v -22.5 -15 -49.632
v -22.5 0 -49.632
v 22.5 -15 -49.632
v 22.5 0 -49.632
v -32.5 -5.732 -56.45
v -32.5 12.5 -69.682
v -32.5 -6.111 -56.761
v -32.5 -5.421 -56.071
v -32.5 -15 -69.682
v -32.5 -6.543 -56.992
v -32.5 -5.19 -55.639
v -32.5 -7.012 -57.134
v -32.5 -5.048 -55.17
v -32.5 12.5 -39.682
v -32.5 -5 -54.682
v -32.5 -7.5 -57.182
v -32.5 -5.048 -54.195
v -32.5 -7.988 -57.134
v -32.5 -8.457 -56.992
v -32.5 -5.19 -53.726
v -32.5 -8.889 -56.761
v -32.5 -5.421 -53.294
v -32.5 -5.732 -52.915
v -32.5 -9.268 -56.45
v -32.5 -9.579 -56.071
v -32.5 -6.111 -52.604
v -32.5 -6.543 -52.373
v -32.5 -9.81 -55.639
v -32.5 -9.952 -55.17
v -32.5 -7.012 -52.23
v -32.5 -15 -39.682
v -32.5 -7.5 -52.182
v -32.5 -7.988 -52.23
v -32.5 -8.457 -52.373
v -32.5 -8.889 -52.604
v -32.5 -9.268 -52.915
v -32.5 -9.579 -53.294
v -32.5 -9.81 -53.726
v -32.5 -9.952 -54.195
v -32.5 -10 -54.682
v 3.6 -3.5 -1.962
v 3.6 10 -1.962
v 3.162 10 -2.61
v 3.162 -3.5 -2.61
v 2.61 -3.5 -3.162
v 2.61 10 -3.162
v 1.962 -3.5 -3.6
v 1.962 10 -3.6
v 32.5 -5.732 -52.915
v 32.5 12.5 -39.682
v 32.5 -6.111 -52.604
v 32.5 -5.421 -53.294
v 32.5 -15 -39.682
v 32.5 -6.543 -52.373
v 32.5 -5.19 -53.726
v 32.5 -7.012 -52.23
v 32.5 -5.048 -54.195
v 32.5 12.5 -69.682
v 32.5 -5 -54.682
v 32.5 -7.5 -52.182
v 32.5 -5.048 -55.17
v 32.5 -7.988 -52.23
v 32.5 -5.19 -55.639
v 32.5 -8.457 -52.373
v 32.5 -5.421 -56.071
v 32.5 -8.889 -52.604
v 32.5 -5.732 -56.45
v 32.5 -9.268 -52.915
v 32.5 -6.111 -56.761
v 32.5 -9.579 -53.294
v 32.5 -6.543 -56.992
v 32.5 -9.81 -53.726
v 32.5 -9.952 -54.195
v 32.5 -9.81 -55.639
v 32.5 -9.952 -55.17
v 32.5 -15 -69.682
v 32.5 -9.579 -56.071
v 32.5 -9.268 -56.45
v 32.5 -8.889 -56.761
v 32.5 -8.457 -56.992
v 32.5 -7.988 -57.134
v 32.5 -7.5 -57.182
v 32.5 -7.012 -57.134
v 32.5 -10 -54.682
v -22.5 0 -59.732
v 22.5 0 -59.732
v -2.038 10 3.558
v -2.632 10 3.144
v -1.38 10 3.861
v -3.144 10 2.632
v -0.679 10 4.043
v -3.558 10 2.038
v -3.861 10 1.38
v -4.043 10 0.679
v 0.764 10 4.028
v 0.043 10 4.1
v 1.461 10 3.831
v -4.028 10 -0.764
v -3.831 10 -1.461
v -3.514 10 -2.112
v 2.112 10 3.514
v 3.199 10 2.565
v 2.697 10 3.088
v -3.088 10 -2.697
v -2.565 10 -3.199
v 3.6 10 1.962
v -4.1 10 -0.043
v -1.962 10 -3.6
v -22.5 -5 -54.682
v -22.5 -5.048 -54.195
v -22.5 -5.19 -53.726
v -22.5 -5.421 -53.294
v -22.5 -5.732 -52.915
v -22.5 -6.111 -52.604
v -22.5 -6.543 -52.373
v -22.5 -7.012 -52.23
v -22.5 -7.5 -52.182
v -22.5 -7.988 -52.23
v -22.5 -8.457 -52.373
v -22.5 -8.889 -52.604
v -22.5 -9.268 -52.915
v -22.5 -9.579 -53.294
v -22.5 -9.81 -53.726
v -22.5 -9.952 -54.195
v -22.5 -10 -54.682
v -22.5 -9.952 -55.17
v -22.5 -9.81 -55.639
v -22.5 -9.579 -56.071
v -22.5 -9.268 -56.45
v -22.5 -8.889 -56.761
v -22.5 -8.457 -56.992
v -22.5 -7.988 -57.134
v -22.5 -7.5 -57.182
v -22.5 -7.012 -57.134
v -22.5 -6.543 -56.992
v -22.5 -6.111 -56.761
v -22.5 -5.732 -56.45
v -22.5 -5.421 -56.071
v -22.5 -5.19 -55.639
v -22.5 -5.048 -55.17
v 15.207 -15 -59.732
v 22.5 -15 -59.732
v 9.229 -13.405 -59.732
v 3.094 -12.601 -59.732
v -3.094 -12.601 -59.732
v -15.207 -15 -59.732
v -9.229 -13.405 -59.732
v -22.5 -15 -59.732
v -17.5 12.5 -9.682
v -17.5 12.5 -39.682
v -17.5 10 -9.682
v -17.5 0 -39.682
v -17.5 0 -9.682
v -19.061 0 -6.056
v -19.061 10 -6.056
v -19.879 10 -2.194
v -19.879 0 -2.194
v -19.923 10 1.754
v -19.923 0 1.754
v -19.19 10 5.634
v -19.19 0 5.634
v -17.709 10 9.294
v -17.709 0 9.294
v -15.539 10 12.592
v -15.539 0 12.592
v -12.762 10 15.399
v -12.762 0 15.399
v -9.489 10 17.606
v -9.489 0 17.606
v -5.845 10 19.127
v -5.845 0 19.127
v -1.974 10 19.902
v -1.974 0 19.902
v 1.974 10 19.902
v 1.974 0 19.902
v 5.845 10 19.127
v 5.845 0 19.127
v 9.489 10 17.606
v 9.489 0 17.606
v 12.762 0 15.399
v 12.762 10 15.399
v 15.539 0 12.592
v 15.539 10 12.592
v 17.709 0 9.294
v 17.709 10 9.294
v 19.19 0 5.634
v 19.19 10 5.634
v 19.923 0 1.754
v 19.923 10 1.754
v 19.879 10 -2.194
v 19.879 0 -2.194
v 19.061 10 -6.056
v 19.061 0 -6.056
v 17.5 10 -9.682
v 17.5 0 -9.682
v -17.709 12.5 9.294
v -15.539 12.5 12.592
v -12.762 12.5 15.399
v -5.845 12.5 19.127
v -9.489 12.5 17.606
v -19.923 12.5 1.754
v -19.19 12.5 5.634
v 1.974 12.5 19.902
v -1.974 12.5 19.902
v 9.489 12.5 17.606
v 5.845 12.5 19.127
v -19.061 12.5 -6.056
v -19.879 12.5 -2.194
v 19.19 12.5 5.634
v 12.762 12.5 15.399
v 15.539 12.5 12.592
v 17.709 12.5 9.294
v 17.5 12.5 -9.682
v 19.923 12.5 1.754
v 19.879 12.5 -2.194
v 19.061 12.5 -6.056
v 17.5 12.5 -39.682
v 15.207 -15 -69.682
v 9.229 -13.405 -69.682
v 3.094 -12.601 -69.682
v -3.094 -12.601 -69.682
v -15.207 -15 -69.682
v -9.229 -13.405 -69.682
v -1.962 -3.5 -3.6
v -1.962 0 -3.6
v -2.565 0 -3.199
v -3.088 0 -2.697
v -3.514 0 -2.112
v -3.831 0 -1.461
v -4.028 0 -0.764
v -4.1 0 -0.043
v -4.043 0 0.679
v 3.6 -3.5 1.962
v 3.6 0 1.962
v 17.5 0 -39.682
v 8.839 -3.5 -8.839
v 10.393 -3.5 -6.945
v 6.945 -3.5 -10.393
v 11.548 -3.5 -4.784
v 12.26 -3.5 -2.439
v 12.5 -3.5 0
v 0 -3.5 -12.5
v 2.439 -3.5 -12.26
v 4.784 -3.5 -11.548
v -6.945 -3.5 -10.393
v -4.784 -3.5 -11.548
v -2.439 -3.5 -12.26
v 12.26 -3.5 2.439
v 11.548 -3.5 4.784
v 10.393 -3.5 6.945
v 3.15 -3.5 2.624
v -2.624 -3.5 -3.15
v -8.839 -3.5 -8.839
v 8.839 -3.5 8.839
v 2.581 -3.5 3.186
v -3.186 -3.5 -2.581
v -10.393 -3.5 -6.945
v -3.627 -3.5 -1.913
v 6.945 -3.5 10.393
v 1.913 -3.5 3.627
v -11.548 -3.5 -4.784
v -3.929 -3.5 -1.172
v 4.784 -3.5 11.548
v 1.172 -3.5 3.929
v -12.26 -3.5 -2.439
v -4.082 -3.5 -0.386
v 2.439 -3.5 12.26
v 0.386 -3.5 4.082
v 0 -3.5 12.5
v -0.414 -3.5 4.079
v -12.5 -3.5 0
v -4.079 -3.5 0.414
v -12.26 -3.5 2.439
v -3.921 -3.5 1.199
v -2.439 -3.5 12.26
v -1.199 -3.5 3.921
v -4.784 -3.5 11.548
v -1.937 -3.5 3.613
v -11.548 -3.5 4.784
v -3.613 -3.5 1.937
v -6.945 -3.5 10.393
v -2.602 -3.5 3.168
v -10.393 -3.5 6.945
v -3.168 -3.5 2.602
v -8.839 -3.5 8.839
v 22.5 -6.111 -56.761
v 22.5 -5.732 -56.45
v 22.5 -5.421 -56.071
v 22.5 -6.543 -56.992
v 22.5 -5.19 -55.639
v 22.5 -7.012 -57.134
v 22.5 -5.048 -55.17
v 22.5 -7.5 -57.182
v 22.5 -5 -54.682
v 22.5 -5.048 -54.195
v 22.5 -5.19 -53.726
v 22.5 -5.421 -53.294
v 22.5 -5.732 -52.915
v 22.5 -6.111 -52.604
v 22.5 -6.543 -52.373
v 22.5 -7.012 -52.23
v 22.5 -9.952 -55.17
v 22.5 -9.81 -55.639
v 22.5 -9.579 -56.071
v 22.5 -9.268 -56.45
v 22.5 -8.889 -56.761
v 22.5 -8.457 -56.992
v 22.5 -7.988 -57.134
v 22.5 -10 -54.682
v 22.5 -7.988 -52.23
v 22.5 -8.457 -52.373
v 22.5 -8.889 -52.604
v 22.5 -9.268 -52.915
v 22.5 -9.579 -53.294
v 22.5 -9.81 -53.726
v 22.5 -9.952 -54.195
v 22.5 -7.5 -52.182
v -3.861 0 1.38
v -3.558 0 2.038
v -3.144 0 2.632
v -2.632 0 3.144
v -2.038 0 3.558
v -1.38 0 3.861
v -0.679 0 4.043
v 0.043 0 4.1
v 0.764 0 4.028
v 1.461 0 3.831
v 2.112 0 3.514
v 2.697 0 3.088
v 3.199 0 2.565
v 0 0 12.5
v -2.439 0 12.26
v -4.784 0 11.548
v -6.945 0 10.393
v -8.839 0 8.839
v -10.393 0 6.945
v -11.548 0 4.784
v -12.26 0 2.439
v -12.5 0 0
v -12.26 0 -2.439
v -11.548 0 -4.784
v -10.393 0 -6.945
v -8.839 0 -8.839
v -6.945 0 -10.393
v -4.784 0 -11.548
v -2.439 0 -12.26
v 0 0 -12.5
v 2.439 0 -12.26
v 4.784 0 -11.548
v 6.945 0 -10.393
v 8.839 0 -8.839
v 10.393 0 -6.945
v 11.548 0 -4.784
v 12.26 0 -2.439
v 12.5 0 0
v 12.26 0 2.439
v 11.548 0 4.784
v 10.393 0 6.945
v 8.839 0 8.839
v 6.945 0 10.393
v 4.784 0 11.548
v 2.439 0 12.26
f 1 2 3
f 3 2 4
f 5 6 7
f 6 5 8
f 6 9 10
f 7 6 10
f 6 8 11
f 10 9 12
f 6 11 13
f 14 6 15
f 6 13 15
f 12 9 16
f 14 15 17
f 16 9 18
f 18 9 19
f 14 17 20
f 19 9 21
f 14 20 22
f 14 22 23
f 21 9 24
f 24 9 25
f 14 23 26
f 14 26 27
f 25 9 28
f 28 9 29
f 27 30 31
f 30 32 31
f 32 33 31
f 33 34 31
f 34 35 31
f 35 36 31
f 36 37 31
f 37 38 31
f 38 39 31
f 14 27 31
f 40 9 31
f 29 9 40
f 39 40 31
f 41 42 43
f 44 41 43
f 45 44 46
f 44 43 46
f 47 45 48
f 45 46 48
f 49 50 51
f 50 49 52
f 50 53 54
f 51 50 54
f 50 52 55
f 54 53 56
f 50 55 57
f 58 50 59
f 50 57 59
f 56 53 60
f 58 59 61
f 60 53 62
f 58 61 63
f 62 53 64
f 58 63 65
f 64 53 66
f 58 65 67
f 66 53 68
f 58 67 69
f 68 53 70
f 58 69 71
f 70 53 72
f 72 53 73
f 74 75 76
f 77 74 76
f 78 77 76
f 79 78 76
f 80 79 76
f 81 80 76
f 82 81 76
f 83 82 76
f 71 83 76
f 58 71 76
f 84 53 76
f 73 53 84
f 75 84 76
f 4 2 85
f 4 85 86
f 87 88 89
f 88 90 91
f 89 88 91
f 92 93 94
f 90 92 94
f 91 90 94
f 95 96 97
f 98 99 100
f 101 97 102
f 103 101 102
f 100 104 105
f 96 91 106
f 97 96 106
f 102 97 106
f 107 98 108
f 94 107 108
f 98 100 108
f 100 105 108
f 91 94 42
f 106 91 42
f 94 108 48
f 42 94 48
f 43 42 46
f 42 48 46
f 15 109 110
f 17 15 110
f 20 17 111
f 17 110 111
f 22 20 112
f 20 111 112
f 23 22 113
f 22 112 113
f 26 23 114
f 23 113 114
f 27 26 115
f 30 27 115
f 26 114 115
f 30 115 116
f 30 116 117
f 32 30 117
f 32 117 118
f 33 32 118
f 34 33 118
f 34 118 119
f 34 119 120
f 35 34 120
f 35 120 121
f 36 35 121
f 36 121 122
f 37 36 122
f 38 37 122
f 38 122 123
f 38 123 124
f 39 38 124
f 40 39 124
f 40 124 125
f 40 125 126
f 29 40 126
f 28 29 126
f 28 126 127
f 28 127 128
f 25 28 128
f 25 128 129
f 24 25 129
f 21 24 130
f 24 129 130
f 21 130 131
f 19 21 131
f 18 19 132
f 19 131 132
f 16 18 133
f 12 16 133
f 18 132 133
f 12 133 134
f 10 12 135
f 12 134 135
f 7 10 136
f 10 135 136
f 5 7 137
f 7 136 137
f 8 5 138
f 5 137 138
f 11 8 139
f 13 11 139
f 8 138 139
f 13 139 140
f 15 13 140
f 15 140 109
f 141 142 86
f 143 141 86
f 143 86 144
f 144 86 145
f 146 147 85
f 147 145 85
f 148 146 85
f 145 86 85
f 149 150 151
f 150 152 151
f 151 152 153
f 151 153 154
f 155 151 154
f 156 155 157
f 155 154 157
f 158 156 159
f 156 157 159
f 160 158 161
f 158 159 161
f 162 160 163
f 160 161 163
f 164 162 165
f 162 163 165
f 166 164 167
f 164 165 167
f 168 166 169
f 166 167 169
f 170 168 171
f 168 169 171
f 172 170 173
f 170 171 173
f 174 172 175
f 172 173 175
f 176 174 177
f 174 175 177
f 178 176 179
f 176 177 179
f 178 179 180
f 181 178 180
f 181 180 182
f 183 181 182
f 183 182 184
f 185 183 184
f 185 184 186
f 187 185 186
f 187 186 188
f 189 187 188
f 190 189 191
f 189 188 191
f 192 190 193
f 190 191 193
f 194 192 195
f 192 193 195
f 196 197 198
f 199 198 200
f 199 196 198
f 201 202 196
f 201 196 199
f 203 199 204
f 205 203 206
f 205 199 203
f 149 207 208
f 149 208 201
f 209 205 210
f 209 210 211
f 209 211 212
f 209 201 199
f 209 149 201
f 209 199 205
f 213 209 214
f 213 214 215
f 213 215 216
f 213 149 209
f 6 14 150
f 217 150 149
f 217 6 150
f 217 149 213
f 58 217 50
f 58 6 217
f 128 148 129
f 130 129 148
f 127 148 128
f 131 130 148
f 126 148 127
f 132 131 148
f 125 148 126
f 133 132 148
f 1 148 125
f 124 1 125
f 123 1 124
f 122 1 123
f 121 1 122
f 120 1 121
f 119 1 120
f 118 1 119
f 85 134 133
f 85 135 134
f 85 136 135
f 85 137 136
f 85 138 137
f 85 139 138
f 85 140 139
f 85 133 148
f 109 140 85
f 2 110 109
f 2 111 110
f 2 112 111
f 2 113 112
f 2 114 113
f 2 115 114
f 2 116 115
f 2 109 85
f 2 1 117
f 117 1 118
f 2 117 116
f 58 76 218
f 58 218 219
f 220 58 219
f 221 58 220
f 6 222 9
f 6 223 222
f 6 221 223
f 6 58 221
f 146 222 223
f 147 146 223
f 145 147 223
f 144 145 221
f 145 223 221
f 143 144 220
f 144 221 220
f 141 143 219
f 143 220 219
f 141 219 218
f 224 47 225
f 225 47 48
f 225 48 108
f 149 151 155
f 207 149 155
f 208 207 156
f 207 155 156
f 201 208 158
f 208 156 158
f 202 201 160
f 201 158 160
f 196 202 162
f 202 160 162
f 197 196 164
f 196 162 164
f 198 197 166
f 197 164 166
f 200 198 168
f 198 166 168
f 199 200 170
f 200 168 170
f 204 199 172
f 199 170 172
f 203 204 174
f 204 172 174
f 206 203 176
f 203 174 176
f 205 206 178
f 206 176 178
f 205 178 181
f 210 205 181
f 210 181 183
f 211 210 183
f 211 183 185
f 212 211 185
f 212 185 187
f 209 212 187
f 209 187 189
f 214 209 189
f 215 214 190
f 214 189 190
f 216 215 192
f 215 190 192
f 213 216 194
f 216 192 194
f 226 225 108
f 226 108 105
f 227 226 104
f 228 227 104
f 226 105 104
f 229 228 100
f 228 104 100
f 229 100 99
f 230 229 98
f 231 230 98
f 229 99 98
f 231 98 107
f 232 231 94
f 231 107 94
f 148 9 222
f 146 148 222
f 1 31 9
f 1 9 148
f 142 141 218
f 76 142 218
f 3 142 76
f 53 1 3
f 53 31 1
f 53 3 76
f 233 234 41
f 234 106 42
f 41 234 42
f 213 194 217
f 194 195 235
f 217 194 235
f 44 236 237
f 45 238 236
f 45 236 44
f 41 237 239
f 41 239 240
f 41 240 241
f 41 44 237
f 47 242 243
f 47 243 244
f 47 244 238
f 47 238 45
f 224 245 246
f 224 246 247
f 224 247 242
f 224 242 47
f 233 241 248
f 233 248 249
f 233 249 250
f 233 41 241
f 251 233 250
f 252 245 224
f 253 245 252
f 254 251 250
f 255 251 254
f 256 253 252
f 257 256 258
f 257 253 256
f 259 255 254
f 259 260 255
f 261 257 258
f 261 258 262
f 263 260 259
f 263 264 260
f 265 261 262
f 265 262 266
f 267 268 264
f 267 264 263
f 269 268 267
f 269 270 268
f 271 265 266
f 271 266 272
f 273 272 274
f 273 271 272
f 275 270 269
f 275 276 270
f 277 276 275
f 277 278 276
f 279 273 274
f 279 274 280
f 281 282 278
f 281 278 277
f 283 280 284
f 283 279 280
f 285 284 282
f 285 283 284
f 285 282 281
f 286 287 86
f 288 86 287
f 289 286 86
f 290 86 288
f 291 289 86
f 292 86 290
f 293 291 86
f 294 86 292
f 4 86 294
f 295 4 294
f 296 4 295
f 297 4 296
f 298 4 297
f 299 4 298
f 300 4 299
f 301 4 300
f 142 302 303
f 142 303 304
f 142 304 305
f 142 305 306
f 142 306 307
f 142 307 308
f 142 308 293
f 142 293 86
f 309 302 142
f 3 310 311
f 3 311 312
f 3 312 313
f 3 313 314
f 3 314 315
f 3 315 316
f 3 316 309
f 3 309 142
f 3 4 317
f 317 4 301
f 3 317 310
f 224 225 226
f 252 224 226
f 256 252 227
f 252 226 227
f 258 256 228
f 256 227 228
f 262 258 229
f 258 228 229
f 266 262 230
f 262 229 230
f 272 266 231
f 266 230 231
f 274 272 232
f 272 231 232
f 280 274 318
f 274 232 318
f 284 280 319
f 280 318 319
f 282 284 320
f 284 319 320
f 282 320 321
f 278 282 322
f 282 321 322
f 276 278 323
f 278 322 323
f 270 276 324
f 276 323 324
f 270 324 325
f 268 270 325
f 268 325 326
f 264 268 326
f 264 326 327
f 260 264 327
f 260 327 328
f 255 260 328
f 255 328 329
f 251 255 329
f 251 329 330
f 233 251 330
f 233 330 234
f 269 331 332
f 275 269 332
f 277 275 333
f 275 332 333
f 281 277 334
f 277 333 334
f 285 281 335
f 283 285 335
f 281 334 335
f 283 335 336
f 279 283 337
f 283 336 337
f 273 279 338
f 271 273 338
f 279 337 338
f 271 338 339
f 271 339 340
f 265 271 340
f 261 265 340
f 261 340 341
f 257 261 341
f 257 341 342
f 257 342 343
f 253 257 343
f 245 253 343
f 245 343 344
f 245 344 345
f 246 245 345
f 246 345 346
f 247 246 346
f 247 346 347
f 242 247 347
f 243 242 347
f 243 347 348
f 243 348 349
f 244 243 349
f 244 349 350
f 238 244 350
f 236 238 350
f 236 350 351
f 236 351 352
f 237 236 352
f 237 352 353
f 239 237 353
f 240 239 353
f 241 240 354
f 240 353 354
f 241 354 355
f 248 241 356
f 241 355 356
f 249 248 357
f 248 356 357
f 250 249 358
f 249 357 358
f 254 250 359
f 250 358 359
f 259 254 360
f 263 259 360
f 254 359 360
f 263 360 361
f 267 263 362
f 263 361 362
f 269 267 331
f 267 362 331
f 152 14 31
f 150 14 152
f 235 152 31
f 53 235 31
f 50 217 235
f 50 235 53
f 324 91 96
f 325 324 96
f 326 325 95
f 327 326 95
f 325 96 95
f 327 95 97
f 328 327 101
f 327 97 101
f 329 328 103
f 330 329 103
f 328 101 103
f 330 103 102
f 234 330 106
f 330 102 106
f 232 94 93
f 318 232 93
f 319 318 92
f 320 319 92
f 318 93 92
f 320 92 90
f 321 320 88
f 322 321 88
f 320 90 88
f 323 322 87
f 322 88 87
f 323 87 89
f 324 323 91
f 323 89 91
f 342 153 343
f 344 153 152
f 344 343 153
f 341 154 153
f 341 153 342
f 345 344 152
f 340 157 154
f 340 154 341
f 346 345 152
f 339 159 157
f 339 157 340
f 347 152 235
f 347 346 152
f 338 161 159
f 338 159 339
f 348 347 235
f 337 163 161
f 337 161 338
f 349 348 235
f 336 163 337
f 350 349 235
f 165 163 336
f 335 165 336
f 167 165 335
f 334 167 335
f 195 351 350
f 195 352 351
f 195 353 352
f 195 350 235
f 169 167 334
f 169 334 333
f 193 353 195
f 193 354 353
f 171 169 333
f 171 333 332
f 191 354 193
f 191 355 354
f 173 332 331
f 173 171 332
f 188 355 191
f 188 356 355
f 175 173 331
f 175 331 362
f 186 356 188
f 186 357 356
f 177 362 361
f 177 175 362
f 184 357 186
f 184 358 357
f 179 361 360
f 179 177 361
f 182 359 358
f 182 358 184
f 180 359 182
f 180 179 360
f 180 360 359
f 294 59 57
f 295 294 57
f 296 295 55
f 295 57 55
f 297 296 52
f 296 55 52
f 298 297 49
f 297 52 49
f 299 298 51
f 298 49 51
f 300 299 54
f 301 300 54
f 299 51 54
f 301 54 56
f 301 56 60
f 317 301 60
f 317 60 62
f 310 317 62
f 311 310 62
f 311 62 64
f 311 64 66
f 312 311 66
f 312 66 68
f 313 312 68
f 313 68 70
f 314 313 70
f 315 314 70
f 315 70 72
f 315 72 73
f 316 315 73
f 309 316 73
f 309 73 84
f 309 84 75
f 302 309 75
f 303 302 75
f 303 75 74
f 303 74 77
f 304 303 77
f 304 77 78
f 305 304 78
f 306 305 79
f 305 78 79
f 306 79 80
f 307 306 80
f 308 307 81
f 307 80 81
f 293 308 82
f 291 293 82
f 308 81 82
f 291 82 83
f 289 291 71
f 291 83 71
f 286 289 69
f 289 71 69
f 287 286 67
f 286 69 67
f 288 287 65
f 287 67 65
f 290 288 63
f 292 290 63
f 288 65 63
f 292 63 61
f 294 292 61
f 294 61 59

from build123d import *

# Parameters (mm, degrees)
SKETCH1_R                = 20
BOSS_EXTRUDE1_DEPTH      = 10
CUT_EXTRUDE1_DEPTH       = 31
BOSS_EXTRUDE2_DEPTH      = 10
SKETCH5_R                = 12.5
BOSS_EXTRUDE3_DEPTH      = 6
BOSS_EXTRUDE4_DEPTH      = 10
BOSS_EXTRUDE4_DEPTH_BACK = 20
SKETCH7_R                = 2.5
CUT_EXTRUDE2_DEPTH       = 97.465771152
BOSS_EXTRUDE5_DEPTH      = 2.5
CUT_EXTRUDE3_START       = -2.5
SKETCH9_R                = 12.5
CUT_EXTRUDE3_DEPTH       = 2.5
SKETCH10_W               = 45
SKETCH10_H               = 15
BOSS_EXTRUDE6_DEPTH      = 9.95
SKETCH11_W               = 45
SKETCH11_H               = 15
BOSS_EXTRUDE7_DEPTH      = 9.95
SKETCH12_R               = 47.5
CUT_EXTRUDE4_DEPTH       = 10


with BuildPart() as part:
    # Sketch1 → Boss-Extrude1 (new body)
    with BuildSketch(Plane(origin=(0, 0, 0), x_dir=(1, 0, 0), z_dir=(0, 1, 0))):
        with Locations(Location((0, 0, 0), (0, 0, 270))):
            Circle(SKETCH1_R)
    extrude(amount=BOSS_EXTRUDE1_DEPTH)

    # Sketch2 → Cut-Extrude1 (cut, through all)
    with BuildSketch(Plane(origin=(0, 10, 0), x_dir=(1, 0, 0), z_dir=(0, 1, 0))):
        with BuildLine():
            Line((1.962141687, 3.6), (-1.962141687, 3.6))
            ThreePointArc((-1.962141687, 3.6), (-3.686980014, 1.793370675), (-4.043407712, -0.678862337))
            ThreePointArc((-4.043407712, -0.678862337), (-2.899137803, -2.899137803), (-0.678862337, -4.043407712))
            ThreePointArc((-0.678862337, -4.043407712), (1.793370675, -3.686980014), (3.6, -1.962141687))
            Line((3.6, -1.962141687), (3.6, 1.962141687))
            ThreePointArc((3.6, 1.962141687), (2.899137803, 2.899137803), (1.962141687, 3.6))
        make_face()
    extrude(amount=-CUT_EXTRUDE1_DEPTH, mode=Mode.SUBTRACT)

    # Sketch3 → Boss-Extrude2 (add)
    with BuildSketch(Plane(origin=(0, 0, 0), x_dir=(1, 0, 0), z_dir=(0, 1, 0))):
        with BuildLine():
            Line((-17.5, 59.682458366), (-17.5, 9.682458366))
            ThreePointArc((-17.5, 9.682458366), (0, 20), (17.5, 9.682458366))
            Line((17.5, 9.682458366), (17.5, 59.682458366))
            Line((17.5, 59.682458366), (-17.5, 59.682458366))
        make_face()
    extrude(amount=BOSS_EXTRUDE2_DEPTH)

    # Sketch5 → Boss-Extrude3 (add)
    with BuildSketch(Plane.XZ):
        with Locations(Location((0, 0, 0), (0, 0, 90))):
            Circle(SKETCH5_R)
        with BuildLine():
            Line((3.6, 1.962141687), (3.6, -1.962141687))
            ThreePointArc((3.6, -1.962141687), (2.899137803, -2.899137803), (1.962141687, -3.6))
            Line((1.962141687, -3.6), (-1.962141687, -3.6))
            ThreePointArc((-1.962141687, -3.6), (-2.899137803, 2.899137803), (3.6, 1.962141687))
        make_face(mode=Mode.SUBTRACT)
    extrude(amount=BOSS_EXTRUDE3_DEPTH)

    # Sketch6 → Boss-Extrude4 (add, two sides: drawn at the far end of the back side and taken through both)
    with BuildSketch(Plane(origin=(0, 0, -59.682458366), x_dir=(-1, 0, 0), z_dir=(0, 0, -1)).offset(-BOSS_EXTRUDE4_DEPTH_BACK)):
        Polygon((-32.5, 10), (32.5, 10), (32.5, -15), (22.5, -15), (22.5, 0), (-22.5, 0), (-22.5, -15), (-32.5, -15), align=None)
    extrude(amount=BOSS_EXTRUDE4_DEPTH + BOSS_EXTRUDE4_DEPTH_BACK)

    # Sketch7 → Cut-Extrude2 (cut, through all)
    with BuildSketch(Plane(origin=(32.5, 0, 0), x_dir=(0, 0, -1), z_dir=(1, 0, 0))):
        with Locations(Location((54.682458366, -7.5, 0), (0, 0, 90))):
            Circle(SKETCH7_R)
    extrude(amount=-CUT_EXTRUDE2_DEPTH, mode=Mode.SUBTRACT)

    # Sketch8 → Boss-Extrude5 (add)
    with BuildSketch(Plane(origin=(0, 10, 0), x_dir=(1, 0, 0), z_dir=(0, 1, 0))):
        with BuildLine():
            Line((-32.5, 69.682458366), (-32.5, 39.682458366))
            Line((-32.5, 39.682458366), (-17.5, 39.682458366))
            Line((-17.5, 39.682458366), (-17.5, 9.682458366))
            ThreePointArc((-17.5, 9.682458366), (0, -20), (17.5, 9.682458366))
            Line((17.5, 9.682458366), (17.5, 39.682458366))
            Line((17.5, 39.682458366), (32.5, 39.682458366))
            Line((32.5, 39.682458366), (32.5, 69.682458366))
            Line((32.5, 69.682458366), (-32.5, 69.682458366))
        make_face()
    extrude(amount=BOSS_EXTRUDE5_DEPTH)

    # Sketch9 → Cut-Extrude3 (cut)
    with BuildSketch(Plane.XZ.offset(6).offset(CUT_EXTRUDE3_START)):
        with Locations(Location((0, 0, 0), (0, 0, 90))):
            Circle(SKETCH9_R)
    extrude(amount=CUT_EXTRUDE3_DEPTH, mode=Mode.SUBTRACT)

    # Sketch10 → Boss-Extrude6 (add)
    with BuildSketch(Plane(origin=(0, 0, -69.682458366), x_dir=(-1, 0, 0), z_dir=(0, 0, -1))):
        with Locations((0, -7.5)):
            Rectangle(SKETCH10_W, SKETCH10_H)
    extrude(amount=-BOSS_EXTRUDE6_DEPTH)

    # Sketch11 → Boss-Extrude7 (add)
    with BuildSketch(Plane.XY.offset(-39.682458366)):
        with Locations((0, -7.5)):
            Rectangle(SKETCH11_W, SKETCH11_H)
    extrude(amount=-BOSS_EXTRUDE7_DEPTH)

    # Sketch12 → Cut-Extrude4 (cut)
    with BuildSketch(Plane(origin=(0, 0, -69.682458366), x_dir=(-1, 0, 0), z_dir=(0, 0, -1))):
        with Locations((0, -60)):
            Circle(SKETCH12_R)
    extrude(amount=-CUT_EXTRUDE4_DEPTH, mode=Mode.SUBTRACT)


solid = part.part
